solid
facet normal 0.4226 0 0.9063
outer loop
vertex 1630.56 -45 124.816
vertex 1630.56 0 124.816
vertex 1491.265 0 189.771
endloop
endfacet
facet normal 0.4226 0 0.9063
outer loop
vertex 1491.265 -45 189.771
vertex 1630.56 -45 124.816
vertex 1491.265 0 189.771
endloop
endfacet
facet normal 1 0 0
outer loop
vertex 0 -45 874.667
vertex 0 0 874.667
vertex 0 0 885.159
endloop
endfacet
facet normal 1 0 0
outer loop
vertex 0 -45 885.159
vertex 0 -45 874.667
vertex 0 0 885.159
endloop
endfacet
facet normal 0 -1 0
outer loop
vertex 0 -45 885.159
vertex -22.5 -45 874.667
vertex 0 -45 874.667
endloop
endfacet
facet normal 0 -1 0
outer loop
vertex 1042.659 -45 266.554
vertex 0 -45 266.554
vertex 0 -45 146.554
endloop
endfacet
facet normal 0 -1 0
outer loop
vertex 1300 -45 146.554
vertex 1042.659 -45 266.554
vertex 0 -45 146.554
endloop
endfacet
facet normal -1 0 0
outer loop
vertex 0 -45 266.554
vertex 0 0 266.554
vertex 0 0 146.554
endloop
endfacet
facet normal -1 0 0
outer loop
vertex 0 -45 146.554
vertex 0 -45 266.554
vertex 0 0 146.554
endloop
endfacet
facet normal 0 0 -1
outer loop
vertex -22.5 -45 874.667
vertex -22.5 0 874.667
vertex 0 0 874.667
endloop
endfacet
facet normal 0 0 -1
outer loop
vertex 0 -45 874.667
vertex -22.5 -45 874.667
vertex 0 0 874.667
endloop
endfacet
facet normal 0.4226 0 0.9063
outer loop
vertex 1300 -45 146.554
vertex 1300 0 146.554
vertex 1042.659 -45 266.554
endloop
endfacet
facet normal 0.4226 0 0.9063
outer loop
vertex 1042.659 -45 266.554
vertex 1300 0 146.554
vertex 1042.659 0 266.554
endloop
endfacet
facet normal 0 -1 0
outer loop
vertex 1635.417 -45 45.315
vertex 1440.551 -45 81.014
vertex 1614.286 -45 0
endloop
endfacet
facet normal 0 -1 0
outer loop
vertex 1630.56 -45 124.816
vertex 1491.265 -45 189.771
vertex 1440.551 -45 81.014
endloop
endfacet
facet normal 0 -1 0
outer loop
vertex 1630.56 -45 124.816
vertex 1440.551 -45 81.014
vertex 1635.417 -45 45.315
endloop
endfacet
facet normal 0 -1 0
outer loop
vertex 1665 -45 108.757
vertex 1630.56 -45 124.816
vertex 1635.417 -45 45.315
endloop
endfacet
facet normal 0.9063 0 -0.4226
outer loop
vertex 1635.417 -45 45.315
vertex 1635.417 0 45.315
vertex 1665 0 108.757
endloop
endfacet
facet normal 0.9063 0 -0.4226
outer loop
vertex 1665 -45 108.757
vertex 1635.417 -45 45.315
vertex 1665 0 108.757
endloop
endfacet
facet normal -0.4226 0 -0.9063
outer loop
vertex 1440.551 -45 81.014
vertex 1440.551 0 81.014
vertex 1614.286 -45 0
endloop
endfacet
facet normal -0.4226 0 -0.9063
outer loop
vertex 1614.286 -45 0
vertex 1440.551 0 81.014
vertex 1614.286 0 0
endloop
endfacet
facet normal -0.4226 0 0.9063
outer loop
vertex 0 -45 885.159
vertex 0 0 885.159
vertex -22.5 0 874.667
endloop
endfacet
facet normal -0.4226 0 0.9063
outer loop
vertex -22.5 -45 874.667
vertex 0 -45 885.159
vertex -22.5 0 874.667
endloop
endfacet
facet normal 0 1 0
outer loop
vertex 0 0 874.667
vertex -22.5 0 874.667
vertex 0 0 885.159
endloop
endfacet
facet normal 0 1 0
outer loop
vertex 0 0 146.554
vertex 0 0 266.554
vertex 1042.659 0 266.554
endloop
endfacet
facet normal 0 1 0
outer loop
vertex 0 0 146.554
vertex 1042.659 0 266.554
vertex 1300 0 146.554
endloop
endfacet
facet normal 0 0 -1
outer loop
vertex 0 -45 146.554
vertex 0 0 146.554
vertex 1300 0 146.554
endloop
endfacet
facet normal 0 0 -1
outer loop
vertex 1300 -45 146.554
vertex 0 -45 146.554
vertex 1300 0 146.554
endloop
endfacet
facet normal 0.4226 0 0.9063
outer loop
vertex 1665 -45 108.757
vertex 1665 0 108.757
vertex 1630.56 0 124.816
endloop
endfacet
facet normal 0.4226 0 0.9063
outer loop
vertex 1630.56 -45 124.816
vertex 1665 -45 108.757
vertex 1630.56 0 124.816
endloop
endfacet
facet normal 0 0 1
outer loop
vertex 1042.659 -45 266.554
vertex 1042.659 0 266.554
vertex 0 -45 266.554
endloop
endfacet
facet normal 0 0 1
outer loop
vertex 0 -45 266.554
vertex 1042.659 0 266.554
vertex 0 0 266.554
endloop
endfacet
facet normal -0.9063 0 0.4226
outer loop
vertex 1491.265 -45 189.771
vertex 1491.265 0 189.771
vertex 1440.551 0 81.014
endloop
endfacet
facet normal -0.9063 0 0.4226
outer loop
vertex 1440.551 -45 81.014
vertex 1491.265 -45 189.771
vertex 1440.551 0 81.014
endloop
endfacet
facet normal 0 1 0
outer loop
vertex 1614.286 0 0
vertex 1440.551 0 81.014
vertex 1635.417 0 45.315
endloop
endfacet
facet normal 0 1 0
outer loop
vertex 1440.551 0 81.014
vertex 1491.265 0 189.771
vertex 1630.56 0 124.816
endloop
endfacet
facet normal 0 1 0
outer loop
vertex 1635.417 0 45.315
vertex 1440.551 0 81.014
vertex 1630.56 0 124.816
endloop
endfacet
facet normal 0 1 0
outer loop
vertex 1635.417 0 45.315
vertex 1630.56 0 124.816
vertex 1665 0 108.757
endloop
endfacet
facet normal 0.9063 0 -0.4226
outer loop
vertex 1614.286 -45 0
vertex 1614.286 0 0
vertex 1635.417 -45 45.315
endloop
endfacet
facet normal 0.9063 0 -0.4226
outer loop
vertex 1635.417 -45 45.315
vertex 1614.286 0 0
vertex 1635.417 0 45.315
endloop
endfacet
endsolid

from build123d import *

# Parameters (mm, degrees)
F1_DEPTH = 45


# Not quite as in the source:
# - a feature names something its author has since deleted; it is built from what else it names


with BuildPart() as f1:
    # F0 (on Front) → F1 (new body)
    with BuildSketch(Plane.XZ):
        Polygon((1440.5510948329, 81.0138275128), (1614.2858085911, 0), (1635.4167216782, 45.3153893518), (1665, 108.7569344444), (1630.5603040926, 124.8164283905), (1491.2652862418, 189.7707619572), align=None)
    extrude(amount=F1_DEPTH)


with BuildPart() as f1b:
    # F0 (on Front) → F1, piece 2 (new body)
    with BuildSketch(Plane.XZ):
        Polygon((1210, 146.5538793955), (1300, 146.5538793955), (1042.6591695389, 266.5538793955), (0, 266.5538793955), (0, 146.5538793955), align=None)
    extrude(amount=F1_DEPTH)


with BuildPart() as f1c:
    # F0 (on Front) → F1, piece 3 (new body)
    with BuildSketch(Plane.XZ):
        Polygon((-22.5, 874.667262964), (0, 874.667262964), (0, 885.1591852725), align=None)
    extrude(amount=F1_DEPTH)


solid = Compound([f1.part, f1b.part, f1c.part])
